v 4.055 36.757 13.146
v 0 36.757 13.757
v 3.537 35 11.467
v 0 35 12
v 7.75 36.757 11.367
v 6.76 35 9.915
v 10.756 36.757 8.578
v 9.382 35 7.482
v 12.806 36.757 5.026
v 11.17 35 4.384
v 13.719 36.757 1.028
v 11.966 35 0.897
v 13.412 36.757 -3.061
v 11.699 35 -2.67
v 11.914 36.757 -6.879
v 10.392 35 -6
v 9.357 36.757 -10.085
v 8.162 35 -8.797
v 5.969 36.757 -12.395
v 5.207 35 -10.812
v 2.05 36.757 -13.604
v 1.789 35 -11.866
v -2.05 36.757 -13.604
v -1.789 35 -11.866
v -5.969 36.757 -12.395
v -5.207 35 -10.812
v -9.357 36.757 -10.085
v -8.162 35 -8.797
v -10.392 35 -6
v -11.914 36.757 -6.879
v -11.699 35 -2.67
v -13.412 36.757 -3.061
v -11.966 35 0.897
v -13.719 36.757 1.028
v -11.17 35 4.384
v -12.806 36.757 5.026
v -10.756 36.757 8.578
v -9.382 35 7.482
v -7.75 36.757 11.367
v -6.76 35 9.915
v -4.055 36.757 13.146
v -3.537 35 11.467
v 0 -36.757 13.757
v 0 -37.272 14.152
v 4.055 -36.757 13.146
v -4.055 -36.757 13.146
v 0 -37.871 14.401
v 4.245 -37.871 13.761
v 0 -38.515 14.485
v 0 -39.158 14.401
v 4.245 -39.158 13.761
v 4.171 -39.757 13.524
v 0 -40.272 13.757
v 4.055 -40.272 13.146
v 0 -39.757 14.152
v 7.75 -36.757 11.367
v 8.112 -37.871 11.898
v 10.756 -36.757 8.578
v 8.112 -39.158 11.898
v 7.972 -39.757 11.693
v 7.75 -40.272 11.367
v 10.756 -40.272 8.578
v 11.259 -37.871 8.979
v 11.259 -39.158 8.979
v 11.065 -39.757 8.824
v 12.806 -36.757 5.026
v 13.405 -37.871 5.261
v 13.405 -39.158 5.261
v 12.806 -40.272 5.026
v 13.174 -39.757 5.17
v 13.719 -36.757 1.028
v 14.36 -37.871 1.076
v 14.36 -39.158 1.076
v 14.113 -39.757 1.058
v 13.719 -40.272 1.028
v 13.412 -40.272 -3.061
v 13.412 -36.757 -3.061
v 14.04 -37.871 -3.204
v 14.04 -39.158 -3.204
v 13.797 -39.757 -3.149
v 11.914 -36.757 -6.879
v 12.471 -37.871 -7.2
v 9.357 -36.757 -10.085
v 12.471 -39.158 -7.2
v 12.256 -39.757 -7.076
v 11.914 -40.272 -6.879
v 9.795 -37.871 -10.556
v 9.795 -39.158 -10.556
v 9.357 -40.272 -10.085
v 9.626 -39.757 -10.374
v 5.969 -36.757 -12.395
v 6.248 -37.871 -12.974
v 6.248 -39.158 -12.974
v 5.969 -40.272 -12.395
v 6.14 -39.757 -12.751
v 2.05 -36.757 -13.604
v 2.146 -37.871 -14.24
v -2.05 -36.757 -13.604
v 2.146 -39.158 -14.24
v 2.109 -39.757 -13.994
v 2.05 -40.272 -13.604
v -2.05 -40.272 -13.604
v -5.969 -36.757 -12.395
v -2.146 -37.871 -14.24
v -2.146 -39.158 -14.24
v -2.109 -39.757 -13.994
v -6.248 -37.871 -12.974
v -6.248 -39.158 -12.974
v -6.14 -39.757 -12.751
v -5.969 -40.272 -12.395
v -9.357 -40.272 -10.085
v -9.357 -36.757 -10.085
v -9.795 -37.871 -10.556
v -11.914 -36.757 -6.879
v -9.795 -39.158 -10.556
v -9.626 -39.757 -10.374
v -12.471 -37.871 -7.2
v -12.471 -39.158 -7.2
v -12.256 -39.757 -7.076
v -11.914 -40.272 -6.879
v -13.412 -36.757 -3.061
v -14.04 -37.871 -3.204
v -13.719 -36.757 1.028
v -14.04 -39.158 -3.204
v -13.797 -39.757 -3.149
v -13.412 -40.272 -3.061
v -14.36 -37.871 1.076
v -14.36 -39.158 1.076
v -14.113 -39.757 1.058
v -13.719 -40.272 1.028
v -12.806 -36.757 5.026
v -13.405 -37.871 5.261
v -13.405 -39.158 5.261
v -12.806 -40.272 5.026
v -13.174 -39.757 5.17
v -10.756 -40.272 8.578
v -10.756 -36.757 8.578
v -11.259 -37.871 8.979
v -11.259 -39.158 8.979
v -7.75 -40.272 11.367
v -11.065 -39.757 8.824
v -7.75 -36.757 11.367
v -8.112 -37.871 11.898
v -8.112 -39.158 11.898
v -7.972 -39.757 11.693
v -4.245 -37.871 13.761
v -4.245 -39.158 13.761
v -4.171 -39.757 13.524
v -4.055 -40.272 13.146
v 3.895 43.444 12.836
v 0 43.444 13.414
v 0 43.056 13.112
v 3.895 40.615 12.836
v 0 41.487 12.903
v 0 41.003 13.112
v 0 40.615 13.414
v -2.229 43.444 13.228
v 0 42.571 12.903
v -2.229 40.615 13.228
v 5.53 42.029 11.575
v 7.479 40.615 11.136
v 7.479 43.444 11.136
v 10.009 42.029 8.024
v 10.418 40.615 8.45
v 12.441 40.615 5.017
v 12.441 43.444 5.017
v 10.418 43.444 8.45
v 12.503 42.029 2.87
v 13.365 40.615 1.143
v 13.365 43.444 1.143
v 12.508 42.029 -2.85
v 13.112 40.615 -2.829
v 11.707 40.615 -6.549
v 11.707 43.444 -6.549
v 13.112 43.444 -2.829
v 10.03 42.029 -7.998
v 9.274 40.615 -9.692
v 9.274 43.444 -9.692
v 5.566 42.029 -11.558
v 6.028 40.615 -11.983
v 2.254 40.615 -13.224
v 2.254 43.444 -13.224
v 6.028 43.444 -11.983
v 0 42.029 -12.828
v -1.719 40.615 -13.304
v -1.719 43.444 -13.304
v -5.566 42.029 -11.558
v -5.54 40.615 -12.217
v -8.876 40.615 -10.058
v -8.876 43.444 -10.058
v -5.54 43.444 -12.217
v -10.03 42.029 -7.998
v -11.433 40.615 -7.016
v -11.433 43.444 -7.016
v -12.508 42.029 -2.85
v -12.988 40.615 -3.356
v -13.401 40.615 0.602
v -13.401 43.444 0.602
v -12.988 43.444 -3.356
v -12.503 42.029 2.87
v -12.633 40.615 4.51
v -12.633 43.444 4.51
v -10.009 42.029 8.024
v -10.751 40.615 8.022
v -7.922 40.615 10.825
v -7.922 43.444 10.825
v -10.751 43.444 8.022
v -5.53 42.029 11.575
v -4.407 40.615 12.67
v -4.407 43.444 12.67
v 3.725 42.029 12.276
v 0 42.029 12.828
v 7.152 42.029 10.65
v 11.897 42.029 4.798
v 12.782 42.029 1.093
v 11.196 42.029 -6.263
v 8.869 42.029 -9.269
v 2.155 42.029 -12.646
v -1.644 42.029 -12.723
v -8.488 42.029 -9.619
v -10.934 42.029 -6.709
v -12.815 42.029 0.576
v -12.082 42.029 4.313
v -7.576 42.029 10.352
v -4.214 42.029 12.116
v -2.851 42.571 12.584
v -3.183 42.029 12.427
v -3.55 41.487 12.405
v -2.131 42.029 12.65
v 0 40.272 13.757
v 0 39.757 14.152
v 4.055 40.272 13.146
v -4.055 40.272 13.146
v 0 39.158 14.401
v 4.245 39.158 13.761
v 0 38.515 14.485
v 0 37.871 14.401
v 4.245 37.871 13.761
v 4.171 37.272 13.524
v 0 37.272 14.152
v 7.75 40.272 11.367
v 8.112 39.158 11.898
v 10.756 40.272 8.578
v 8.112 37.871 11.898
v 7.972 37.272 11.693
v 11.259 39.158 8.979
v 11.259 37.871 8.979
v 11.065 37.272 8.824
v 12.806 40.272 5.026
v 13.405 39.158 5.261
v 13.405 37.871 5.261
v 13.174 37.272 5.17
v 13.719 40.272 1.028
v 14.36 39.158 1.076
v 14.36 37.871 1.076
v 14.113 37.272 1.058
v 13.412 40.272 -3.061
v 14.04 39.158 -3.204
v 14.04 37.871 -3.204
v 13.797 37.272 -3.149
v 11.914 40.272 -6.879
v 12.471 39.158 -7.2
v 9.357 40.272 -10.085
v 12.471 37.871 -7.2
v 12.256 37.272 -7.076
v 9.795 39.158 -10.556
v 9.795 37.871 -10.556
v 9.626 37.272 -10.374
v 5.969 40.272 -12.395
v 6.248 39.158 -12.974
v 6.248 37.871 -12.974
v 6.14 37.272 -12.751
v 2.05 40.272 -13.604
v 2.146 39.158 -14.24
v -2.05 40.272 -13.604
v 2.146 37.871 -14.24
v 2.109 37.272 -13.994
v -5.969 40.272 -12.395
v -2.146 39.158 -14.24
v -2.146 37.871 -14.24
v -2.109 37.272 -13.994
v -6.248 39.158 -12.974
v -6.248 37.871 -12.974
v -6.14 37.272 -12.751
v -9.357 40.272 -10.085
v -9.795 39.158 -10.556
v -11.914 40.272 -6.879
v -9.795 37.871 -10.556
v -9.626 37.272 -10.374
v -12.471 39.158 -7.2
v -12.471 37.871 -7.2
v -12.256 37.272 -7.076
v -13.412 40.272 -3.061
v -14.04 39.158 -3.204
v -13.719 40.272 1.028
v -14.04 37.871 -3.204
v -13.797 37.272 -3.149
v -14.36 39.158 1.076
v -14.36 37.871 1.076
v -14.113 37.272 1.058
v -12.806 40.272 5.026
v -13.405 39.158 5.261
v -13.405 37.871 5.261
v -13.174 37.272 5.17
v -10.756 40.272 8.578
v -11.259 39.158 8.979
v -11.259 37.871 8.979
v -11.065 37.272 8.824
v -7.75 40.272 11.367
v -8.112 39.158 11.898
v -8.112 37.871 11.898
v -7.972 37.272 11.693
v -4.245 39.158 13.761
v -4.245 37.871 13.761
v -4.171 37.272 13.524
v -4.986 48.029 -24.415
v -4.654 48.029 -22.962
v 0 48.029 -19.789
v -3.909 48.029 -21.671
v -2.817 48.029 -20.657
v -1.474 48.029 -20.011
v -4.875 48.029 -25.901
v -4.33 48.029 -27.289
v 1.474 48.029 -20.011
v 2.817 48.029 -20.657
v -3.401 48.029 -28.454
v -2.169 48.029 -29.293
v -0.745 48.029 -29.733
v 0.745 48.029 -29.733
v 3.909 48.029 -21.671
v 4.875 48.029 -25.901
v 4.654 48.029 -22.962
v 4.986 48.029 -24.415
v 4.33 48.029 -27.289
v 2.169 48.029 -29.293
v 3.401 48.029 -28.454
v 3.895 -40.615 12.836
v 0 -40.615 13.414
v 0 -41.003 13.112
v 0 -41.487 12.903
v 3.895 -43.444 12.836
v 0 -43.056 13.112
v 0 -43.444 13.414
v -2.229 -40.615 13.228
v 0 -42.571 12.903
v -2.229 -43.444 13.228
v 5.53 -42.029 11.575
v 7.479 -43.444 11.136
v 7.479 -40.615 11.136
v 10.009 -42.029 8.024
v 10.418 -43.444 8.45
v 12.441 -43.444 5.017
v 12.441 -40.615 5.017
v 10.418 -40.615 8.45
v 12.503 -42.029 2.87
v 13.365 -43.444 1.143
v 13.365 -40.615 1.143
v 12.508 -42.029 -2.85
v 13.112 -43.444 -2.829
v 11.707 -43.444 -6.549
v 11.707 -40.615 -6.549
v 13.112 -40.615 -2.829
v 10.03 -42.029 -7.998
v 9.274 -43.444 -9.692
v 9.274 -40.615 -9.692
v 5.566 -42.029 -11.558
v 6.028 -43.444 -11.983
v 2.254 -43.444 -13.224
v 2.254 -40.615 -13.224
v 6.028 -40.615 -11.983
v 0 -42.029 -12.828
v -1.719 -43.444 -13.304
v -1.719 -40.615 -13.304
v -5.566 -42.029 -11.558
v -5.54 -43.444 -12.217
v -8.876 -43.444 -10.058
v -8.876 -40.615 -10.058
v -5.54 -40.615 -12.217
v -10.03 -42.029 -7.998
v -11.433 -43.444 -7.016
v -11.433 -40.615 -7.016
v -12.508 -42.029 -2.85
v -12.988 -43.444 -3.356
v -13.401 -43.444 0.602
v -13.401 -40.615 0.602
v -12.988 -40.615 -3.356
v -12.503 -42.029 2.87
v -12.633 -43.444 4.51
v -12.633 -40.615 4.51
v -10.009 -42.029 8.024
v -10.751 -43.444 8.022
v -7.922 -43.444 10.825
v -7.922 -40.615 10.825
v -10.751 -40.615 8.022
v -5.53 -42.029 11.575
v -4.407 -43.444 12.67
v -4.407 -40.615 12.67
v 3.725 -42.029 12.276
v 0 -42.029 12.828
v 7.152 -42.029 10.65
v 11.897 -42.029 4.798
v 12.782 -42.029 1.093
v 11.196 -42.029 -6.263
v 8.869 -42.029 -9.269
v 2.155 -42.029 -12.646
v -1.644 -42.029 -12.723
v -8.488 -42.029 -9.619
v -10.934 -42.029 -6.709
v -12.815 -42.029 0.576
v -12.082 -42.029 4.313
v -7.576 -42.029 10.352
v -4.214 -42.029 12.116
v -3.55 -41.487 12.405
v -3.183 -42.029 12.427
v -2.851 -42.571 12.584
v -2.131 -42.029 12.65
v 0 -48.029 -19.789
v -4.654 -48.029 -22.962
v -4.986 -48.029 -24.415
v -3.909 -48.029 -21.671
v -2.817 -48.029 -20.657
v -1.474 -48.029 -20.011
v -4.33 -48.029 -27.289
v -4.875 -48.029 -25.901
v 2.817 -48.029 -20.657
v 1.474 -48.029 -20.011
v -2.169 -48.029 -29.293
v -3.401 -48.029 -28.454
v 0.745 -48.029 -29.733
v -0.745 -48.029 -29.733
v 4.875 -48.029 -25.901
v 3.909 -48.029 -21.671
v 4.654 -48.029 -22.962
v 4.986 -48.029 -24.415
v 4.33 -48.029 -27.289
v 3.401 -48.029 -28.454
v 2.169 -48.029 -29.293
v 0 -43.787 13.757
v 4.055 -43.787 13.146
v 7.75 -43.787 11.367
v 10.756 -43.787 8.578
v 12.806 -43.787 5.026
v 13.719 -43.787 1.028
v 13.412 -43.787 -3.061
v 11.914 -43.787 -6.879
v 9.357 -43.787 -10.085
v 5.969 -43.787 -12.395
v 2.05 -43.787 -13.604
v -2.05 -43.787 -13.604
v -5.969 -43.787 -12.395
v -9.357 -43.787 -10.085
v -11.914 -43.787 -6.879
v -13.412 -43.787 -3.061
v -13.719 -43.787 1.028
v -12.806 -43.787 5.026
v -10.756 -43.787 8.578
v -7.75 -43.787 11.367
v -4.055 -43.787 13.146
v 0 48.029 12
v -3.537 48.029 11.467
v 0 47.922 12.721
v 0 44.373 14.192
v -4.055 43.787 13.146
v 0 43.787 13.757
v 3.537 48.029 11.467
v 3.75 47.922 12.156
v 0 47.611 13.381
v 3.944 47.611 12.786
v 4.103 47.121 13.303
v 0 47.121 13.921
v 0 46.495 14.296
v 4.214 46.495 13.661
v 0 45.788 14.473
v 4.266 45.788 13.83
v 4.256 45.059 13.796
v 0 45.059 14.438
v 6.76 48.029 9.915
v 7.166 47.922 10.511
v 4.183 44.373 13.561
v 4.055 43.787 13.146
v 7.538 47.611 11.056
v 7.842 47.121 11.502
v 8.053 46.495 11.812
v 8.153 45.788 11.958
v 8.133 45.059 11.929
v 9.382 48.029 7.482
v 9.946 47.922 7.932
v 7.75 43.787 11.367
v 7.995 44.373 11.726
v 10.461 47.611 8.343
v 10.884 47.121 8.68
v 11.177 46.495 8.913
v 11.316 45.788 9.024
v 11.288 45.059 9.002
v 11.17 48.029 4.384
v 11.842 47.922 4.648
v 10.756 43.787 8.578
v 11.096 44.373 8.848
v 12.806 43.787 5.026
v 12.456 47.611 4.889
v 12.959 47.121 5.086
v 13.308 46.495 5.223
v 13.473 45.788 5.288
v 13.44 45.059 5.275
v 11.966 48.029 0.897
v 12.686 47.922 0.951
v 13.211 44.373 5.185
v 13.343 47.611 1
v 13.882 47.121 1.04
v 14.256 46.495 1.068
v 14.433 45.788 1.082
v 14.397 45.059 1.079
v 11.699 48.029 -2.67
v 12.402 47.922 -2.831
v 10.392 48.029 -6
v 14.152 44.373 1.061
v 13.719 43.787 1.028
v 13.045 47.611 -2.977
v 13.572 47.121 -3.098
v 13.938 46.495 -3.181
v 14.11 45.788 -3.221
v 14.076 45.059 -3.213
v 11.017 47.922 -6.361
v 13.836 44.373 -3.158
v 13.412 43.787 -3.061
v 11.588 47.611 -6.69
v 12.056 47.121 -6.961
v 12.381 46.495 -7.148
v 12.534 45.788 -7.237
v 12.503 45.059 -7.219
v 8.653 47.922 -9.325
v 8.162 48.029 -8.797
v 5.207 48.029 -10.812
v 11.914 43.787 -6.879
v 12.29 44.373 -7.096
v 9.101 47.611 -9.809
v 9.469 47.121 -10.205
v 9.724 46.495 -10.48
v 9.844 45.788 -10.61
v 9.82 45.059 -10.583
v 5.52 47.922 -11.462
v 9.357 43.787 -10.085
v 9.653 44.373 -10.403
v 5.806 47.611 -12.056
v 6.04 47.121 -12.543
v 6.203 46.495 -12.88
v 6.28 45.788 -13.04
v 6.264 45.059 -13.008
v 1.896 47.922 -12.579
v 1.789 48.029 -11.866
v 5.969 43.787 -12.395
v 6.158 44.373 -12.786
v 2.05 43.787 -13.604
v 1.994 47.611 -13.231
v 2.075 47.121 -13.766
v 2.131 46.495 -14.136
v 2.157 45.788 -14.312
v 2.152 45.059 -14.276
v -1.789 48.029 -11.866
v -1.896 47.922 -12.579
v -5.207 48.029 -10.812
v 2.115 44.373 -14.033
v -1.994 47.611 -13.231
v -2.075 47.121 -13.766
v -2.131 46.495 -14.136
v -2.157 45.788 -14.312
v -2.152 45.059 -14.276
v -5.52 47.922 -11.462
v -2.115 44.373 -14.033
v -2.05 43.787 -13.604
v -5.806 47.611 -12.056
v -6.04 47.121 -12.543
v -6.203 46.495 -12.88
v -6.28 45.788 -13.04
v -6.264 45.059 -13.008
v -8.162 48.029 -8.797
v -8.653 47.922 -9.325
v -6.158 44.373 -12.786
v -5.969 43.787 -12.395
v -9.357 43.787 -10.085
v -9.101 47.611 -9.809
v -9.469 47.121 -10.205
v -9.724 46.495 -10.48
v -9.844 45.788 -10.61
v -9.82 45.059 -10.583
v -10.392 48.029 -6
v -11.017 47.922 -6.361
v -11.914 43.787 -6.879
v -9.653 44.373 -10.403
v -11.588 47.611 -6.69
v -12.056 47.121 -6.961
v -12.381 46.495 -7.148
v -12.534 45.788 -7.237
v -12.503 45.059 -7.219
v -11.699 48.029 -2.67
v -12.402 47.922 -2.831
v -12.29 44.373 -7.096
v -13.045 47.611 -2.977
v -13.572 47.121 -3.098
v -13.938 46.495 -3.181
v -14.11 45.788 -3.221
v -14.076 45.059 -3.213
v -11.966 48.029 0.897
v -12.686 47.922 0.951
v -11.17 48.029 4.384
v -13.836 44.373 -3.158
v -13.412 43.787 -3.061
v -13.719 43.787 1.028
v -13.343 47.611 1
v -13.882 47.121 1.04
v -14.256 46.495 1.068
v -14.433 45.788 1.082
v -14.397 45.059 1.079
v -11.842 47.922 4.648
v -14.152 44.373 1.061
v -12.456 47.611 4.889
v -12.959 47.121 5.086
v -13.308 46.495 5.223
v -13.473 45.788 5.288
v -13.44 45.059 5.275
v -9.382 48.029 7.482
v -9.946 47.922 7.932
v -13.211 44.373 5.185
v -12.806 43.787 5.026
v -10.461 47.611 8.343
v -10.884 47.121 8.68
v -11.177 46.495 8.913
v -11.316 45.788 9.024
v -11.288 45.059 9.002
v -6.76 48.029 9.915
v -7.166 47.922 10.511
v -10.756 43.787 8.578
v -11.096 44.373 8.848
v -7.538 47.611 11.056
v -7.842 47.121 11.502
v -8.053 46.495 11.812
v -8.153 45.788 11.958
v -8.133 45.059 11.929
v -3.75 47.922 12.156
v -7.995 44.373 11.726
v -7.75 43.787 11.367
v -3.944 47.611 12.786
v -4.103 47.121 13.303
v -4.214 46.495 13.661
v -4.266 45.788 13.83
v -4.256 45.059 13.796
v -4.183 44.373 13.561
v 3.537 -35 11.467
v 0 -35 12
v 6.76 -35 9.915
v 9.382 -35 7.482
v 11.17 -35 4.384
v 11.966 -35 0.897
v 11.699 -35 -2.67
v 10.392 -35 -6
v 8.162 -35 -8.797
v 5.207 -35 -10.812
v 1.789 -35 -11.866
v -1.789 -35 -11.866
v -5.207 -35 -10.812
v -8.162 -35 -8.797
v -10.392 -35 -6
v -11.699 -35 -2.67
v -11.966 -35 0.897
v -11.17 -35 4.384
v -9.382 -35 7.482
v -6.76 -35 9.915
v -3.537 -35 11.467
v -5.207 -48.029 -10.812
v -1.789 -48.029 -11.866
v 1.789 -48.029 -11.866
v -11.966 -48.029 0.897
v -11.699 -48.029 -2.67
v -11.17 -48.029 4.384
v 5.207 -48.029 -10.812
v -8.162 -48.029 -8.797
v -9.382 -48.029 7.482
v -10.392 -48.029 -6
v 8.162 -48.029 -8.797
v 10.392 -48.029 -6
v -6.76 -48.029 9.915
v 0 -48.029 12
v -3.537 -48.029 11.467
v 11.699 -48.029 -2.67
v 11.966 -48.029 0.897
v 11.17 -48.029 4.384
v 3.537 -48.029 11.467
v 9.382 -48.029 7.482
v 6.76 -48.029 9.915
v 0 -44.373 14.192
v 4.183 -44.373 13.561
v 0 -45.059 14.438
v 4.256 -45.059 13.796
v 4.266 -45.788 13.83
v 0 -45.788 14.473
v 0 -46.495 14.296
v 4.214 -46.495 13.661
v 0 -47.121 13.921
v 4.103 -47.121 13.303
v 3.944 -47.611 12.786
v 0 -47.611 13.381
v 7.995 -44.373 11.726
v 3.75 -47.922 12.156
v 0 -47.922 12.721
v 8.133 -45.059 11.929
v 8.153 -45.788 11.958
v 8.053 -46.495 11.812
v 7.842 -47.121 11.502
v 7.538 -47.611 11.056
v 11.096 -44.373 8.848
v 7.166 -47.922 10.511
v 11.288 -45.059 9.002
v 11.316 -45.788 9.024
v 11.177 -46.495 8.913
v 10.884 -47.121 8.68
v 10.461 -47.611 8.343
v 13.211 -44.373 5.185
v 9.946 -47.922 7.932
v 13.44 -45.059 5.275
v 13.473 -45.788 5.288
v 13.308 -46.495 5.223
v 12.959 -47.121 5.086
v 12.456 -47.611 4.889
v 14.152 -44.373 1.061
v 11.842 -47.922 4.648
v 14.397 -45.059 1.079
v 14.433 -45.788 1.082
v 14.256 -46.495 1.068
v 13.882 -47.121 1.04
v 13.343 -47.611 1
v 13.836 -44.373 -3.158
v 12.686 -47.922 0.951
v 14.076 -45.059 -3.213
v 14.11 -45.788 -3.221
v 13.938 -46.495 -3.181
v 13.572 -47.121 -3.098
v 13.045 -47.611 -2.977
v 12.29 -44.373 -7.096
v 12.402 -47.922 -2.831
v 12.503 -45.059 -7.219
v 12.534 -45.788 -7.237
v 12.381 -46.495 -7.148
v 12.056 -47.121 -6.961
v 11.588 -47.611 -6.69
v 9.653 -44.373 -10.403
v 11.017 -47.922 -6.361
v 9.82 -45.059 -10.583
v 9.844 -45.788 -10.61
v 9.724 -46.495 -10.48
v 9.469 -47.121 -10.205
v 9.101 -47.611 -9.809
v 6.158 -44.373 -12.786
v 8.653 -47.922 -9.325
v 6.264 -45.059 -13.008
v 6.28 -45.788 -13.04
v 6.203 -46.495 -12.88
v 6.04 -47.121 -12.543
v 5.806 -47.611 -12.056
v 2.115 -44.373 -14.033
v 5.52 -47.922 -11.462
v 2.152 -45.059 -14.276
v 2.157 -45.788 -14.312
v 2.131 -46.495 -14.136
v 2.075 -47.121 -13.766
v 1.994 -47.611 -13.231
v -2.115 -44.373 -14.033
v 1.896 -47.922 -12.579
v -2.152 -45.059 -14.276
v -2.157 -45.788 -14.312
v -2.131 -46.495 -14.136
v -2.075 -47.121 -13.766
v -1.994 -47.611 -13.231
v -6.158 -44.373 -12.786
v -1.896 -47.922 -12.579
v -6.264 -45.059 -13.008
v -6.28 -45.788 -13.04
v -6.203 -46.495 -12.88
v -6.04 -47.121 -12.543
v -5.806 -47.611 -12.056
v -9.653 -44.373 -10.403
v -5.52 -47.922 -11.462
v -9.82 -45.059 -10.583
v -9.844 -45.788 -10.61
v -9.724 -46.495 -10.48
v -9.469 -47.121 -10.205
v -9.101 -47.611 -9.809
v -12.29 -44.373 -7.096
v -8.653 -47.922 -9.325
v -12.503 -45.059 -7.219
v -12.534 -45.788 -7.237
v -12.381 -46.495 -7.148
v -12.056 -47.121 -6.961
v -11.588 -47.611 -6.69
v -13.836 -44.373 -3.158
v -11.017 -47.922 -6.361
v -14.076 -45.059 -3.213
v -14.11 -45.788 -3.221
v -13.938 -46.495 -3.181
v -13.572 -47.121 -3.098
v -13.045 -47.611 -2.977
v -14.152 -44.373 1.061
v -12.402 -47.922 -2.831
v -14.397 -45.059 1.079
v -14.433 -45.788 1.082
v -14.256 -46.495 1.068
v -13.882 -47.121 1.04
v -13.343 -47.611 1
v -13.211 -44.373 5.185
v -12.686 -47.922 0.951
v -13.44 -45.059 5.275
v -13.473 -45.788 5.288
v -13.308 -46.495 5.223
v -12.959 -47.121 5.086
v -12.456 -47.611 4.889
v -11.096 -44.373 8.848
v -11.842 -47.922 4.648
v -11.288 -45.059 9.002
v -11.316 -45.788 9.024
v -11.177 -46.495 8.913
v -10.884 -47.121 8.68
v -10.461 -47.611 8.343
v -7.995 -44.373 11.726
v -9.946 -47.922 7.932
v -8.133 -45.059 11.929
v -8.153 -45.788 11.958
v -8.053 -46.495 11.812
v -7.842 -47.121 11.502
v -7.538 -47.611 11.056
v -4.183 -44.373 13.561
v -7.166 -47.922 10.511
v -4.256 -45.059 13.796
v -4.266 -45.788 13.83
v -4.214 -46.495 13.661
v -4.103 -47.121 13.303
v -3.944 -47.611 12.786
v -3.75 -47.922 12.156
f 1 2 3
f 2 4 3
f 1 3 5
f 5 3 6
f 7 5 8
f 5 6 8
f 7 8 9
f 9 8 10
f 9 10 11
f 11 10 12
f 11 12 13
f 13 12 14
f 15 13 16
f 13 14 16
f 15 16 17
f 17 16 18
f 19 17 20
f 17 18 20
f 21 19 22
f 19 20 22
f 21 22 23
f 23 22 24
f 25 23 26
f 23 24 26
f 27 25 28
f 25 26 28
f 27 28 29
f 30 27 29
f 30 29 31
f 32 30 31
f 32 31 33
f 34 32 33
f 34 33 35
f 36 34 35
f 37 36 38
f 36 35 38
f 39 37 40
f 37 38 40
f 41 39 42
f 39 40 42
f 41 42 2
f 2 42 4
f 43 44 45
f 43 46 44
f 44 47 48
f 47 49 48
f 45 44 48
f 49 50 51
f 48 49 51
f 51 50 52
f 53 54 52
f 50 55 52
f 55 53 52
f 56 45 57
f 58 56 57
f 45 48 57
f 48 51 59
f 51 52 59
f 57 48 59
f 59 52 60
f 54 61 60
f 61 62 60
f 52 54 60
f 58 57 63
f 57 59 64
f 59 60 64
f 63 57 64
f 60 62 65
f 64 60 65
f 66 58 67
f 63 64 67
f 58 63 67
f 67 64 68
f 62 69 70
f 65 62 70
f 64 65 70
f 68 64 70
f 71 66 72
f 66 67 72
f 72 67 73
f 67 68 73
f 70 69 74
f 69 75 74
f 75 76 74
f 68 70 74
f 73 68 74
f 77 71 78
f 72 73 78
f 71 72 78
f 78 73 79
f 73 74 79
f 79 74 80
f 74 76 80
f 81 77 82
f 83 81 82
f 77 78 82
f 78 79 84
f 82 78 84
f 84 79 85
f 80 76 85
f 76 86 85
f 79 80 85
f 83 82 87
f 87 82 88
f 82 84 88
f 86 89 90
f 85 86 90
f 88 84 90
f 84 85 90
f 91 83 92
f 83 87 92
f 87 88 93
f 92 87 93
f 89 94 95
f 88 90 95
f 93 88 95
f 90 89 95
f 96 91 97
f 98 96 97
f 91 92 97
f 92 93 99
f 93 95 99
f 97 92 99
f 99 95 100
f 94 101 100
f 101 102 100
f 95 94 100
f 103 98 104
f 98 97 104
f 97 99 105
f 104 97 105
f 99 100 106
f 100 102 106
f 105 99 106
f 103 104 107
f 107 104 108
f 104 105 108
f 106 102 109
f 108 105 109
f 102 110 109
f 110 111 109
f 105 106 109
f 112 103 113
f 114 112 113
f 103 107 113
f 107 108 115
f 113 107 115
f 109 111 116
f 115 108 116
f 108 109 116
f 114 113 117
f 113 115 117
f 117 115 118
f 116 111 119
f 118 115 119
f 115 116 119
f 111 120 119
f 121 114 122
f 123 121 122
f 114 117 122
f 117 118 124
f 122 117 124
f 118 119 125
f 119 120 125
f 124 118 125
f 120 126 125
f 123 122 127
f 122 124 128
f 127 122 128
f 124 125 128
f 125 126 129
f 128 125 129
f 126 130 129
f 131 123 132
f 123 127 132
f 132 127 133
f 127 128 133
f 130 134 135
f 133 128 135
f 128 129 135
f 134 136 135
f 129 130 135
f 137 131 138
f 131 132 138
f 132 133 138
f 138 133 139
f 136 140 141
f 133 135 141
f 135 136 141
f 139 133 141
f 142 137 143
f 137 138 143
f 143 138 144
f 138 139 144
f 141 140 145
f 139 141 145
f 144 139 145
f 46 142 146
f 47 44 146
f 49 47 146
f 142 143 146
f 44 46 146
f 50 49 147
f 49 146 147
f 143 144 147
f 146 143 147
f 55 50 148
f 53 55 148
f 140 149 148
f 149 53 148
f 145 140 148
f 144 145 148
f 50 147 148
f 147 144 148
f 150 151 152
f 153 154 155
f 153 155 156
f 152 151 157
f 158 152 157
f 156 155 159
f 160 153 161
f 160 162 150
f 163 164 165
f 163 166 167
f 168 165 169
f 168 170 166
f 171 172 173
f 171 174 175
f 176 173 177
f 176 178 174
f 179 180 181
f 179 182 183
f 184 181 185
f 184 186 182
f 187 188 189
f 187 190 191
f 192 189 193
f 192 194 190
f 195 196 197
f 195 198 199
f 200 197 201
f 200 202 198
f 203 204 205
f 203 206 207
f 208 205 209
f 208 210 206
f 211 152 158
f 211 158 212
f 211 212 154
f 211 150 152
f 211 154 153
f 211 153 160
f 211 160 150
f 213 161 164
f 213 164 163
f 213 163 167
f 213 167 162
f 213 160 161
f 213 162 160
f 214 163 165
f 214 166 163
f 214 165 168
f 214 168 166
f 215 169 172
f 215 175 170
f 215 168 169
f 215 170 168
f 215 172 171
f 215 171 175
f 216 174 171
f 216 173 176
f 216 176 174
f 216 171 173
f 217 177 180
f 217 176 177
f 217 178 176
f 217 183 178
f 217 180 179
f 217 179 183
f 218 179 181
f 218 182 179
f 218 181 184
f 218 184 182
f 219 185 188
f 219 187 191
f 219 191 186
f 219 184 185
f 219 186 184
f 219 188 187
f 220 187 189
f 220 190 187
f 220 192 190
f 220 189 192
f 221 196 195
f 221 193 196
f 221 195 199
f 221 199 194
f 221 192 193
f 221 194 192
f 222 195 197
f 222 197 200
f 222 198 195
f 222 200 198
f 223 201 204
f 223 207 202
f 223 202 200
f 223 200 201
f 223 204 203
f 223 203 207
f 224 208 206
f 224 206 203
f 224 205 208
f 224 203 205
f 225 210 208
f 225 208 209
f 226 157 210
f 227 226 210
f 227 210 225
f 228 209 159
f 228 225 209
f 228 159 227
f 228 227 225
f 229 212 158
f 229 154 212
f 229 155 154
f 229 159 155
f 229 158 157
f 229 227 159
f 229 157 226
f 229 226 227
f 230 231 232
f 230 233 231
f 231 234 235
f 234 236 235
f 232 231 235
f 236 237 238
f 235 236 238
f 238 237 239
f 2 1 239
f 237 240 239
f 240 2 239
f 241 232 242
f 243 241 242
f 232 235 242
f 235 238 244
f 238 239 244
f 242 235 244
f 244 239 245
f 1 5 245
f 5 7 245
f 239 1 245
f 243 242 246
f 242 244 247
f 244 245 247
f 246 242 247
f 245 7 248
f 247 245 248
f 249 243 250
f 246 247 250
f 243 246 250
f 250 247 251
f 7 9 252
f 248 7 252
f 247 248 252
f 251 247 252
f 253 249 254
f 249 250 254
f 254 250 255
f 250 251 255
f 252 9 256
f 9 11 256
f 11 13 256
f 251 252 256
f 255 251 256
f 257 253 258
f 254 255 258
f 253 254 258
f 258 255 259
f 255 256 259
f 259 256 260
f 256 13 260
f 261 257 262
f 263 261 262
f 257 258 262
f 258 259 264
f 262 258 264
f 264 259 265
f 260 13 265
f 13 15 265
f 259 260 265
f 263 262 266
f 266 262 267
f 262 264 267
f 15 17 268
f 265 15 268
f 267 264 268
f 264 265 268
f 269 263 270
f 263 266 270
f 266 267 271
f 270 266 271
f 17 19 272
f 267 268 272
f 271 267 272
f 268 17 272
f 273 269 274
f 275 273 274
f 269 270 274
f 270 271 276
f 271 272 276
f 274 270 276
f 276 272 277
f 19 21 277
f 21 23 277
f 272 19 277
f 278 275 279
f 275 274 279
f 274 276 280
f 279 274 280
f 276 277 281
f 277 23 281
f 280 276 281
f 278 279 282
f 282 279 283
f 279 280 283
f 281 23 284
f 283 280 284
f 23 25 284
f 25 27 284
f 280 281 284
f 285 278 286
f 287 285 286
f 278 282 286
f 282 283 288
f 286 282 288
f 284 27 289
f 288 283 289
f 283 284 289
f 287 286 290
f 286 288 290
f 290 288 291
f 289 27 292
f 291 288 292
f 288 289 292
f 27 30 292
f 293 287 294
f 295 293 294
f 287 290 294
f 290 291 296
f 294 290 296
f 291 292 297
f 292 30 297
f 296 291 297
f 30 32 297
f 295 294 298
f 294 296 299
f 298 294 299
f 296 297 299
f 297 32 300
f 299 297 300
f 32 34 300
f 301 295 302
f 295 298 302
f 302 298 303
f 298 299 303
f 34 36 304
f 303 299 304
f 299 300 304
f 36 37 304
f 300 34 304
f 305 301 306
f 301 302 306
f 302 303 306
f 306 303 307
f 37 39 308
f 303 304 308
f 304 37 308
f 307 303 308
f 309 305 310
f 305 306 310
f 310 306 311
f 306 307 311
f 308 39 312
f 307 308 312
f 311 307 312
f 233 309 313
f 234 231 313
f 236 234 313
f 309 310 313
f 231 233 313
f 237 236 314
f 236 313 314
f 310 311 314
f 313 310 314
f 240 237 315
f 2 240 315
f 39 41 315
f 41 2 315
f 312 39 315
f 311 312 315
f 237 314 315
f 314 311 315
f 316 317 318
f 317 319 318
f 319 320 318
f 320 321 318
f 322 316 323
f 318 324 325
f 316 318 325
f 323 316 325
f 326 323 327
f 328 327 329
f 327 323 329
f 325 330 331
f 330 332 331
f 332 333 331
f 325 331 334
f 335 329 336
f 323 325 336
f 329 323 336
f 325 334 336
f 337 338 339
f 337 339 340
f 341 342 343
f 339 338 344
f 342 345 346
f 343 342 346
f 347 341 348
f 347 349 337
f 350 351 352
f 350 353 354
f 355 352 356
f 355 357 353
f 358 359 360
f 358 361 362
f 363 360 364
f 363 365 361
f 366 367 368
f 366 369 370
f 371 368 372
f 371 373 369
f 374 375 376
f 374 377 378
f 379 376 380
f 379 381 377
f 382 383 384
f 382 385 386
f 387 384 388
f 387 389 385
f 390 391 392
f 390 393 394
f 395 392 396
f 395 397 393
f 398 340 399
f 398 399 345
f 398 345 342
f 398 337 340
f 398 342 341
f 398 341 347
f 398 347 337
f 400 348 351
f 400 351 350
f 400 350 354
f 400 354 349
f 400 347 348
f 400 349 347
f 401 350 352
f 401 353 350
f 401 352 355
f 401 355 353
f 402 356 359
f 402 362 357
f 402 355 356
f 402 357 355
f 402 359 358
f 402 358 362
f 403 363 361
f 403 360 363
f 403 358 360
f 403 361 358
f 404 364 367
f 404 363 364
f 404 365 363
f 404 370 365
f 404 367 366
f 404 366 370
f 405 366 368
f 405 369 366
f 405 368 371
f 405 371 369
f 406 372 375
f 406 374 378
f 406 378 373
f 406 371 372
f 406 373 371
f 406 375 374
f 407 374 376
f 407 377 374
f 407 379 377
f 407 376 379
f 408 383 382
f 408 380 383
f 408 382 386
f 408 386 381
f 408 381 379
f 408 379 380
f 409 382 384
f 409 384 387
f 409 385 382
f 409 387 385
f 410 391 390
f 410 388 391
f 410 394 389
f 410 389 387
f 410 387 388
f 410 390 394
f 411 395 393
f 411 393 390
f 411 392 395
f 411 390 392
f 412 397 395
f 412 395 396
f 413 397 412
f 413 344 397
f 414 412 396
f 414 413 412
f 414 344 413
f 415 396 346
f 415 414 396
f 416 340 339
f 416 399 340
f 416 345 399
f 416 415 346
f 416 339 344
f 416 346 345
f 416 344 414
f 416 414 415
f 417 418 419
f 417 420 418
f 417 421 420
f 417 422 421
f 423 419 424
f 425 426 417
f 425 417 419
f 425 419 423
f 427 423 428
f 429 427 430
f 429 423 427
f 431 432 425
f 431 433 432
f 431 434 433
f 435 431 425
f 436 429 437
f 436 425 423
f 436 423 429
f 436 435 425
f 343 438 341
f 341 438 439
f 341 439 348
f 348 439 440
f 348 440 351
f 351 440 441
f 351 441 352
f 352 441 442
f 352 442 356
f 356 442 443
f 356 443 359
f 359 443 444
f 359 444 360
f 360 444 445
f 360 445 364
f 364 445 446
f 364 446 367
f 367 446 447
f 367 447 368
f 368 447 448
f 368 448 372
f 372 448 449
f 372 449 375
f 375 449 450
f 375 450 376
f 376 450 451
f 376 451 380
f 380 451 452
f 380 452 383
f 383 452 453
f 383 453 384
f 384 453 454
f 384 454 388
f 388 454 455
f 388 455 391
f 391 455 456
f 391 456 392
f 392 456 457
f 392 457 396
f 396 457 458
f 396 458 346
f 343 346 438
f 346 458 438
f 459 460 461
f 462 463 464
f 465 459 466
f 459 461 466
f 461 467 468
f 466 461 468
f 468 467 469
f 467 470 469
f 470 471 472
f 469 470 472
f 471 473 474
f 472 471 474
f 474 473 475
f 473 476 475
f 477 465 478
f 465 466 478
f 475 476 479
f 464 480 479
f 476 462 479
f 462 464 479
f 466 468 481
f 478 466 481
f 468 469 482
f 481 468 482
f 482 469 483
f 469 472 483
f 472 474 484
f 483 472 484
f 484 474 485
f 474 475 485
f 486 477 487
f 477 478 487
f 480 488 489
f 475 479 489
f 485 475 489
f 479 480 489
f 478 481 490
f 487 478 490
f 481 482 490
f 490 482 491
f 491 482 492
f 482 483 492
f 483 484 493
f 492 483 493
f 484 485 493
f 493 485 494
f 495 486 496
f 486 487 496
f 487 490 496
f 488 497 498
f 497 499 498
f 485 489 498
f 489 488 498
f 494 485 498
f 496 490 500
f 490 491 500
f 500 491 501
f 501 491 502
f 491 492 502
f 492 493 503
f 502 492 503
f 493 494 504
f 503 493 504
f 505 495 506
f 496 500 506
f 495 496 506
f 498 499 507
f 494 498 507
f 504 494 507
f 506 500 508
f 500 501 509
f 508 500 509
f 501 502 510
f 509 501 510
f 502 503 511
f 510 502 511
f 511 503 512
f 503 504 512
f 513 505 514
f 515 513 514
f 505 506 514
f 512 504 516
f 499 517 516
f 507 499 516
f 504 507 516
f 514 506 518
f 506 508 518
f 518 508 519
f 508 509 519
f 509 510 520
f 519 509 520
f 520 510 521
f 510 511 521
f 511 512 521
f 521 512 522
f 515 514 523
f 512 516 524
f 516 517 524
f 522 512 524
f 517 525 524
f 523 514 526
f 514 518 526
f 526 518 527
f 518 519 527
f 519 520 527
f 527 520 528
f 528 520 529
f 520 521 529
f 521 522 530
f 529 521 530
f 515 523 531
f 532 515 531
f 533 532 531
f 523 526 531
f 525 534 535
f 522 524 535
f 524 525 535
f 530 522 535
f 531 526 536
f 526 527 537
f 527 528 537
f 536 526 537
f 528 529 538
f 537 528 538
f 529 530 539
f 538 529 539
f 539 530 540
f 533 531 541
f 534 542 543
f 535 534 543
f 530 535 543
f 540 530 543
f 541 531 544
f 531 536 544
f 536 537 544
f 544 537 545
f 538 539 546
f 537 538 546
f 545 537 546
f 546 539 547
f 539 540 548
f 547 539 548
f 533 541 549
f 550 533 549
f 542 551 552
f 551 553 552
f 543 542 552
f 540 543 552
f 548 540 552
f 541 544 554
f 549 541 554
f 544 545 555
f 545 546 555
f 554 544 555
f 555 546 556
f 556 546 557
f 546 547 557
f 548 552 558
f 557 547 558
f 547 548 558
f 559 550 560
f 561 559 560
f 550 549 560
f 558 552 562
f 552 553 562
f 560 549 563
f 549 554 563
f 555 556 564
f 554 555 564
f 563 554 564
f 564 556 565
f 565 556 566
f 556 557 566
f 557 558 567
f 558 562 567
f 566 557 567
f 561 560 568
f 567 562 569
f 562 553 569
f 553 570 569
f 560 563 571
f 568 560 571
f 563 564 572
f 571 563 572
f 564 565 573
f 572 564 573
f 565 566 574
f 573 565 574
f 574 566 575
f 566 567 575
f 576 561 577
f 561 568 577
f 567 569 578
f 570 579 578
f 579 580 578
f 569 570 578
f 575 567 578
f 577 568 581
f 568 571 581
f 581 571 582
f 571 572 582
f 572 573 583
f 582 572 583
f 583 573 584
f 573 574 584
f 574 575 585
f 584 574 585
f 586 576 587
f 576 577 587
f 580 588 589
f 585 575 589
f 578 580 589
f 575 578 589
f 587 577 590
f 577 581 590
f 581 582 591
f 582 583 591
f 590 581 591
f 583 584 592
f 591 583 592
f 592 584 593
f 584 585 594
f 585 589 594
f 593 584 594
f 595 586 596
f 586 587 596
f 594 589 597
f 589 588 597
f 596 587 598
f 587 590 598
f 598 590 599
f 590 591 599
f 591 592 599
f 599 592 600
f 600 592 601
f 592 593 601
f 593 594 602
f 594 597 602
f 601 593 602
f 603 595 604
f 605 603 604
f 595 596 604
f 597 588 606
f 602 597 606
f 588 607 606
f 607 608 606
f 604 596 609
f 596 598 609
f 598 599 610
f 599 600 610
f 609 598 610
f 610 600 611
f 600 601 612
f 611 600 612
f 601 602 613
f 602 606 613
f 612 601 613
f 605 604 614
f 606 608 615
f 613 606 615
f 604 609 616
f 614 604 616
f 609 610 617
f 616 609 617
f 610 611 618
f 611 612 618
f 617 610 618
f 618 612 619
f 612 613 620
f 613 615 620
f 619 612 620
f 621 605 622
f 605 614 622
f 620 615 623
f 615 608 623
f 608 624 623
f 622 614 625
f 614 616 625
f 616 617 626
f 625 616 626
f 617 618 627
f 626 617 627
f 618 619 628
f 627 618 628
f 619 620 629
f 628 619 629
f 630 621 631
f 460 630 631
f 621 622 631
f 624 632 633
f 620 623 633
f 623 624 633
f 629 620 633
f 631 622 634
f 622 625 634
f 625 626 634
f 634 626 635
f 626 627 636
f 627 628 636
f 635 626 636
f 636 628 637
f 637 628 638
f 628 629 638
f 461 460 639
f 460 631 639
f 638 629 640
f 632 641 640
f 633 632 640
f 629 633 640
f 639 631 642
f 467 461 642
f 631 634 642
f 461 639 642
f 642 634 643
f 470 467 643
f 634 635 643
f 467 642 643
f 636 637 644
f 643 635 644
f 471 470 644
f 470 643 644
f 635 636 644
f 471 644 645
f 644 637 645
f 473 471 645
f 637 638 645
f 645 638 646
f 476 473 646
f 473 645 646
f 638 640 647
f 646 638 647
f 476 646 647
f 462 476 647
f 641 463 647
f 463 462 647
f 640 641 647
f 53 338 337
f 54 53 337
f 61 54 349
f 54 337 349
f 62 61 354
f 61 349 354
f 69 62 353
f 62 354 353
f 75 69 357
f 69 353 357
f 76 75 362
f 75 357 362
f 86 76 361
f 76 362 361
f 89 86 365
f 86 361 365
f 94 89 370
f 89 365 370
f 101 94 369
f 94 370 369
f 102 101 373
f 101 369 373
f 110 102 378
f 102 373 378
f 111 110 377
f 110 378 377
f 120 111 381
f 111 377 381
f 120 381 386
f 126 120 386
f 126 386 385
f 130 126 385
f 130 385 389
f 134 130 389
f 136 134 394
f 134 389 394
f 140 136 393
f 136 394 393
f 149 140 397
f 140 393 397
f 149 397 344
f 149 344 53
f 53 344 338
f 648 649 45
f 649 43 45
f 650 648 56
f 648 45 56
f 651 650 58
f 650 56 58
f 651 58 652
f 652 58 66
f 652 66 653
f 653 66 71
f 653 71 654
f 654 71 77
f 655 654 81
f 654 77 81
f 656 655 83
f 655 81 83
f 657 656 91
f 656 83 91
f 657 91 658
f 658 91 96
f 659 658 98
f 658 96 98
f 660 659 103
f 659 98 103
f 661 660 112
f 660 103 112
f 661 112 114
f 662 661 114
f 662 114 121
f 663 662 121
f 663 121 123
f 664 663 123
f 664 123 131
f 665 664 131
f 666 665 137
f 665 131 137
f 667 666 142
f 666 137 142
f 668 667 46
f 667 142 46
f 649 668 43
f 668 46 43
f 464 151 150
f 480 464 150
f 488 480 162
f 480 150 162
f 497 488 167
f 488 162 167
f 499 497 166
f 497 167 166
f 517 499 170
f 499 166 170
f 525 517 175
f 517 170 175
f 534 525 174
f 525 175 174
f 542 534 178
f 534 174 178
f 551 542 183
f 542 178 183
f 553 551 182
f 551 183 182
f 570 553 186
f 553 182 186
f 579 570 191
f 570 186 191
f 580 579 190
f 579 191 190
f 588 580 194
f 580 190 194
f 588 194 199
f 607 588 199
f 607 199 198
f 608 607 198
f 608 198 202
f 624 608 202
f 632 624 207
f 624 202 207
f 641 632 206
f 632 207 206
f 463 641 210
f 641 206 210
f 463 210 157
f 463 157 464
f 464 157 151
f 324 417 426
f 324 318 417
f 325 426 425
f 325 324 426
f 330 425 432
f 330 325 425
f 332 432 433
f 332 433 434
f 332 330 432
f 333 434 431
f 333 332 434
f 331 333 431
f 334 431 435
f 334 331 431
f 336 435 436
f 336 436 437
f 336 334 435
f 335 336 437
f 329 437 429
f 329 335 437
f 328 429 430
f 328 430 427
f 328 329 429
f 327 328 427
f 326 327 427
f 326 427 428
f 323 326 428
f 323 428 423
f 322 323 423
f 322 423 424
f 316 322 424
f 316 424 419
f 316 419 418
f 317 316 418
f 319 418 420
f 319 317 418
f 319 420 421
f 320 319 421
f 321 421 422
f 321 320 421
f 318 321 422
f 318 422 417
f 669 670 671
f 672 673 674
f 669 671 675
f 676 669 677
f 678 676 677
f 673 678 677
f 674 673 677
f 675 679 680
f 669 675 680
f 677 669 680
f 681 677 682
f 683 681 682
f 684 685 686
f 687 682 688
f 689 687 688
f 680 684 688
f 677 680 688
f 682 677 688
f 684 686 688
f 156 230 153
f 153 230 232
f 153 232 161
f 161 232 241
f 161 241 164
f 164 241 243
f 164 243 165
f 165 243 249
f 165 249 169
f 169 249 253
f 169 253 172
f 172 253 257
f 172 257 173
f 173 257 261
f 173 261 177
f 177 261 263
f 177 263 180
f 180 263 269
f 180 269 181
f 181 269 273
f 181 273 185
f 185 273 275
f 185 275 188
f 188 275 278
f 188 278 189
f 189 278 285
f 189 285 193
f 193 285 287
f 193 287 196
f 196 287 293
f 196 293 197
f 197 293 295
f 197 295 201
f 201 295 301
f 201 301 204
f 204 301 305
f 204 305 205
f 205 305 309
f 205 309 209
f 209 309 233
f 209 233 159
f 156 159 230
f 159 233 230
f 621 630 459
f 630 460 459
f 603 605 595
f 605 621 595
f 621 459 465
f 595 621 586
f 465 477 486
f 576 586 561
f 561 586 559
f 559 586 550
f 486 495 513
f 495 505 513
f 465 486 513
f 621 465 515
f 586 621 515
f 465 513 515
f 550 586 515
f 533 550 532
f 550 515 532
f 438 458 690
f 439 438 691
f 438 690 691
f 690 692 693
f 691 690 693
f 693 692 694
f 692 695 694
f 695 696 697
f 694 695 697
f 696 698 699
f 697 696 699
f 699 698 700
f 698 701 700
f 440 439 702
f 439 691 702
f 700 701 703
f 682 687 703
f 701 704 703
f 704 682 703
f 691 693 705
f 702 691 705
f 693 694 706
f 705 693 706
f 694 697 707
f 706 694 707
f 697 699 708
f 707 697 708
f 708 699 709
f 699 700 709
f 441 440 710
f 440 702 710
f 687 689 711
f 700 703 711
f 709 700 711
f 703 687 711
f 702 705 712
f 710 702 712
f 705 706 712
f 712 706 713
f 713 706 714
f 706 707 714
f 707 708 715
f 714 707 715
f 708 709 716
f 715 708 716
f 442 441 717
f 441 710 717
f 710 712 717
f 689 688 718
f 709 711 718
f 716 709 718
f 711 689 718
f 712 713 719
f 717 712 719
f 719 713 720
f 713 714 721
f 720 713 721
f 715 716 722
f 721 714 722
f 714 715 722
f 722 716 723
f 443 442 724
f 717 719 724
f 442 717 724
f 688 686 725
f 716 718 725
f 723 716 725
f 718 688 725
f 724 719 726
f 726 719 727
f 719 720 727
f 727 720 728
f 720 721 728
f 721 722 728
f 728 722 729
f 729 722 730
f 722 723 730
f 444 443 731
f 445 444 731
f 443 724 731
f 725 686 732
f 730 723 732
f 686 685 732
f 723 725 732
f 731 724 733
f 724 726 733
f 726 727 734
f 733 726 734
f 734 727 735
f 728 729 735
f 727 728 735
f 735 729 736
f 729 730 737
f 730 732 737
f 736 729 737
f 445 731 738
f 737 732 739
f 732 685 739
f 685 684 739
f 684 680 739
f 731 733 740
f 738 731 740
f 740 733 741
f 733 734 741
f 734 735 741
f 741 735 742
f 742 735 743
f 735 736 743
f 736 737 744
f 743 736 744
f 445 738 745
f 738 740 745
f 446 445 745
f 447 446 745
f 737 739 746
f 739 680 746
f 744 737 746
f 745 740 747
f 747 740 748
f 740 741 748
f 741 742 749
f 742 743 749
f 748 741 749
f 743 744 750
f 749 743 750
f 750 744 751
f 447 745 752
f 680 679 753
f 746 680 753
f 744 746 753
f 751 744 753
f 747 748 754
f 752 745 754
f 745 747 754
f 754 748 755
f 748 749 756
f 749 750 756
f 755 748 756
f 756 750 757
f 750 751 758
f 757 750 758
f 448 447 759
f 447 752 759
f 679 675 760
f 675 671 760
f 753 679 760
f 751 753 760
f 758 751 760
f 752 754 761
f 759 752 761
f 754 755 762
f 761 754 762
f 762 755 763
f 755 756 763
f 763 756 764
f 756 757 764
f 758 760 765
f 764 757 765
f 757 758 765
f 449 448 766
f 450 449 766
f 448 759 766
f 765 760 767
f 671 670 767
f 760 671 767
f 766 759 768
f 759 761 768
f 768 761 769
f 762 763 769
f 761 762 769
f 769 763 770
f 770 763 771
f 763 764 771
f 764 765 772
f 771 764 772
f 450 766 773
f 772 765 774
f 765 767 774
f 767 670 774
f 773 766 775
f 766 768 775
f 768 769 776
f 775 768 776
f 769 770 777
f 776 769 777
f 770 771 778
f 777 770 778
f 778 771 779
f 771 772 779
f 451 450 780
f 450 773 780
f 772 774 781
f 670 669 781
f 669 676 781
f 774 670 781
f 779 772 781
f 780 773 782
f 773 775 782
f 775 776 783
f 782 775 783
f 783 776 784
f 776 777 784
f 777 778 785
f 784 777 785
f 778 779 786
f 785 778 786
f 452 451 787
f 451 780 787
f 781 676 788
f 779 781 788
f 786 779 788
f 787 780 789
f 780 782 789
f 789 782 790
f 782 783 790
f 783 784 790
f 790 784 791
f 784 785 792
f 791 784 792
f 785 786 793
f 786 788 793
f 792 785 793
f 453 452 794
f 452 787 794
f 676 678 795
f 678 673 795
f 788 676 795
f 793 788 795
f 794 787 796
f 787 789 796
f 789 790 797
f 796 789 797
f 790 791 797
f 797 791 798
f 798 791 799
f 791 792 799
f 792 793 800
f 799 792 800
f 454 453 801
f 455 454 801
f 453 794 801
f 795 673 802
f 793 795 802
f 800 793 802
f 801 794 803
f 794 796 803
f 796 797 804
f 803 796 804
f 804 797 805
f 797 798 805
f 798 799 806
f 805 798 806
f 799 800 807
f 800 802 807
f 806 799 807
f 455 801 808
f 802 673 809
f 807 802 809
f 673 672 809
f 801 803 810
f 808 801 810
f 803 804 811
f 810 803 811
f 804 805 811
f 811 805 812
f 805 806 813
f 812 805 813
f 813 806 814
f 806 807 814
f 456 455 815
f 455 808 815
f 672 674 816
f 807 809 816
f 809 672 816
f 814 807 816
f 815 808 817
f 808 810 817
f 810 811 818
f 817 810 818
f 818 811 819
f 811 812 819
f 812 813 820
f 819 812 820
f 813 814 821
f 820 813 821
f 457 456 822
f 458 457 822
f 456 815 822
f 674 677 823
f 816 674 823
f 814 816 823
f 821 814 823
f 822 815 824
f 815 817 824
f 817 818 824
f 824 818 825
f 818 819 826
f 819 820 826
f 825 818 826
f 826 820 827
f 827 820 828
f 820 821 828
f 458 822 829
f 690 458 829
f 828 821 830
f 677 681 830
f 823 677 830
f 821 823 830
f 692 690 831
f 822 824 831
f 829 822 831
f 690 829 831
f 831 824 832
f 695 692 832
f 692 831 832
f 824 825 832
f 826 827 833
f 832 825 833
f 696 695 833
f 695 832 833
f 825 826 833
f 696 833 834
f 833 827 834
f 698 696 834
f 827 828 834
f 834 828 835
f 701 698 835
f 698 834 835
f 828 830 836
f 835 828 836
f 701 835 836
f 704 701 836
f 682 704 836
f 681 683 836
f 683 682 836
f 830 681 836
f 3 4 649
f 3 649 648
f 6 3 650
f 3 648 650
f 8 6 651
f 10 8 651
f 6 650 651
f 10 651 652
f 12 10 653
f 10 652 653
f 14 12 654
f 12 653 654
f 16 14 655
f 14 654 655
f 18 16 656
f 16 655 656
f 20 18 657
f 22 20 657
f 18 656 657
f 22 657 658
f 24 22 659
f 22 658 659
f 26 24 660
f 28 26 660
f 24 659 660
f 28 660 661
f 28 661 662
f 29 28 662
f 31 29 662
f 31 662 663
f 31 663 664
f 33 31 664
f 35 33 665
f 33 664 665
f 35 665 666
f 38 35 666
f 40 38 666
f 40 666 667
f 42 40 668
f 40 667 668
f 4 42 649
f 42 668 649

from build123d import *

# Parameters (mm, degrees)
F2_R = 2
F0_W = 96.058874
F0_H = 5


with BuildPart() as f1:
    # F0 (on Right) → F1 (revolve)
    with BuildSketch(Plane.YZ):
        with BuildLine():
            Line((-48.029437, 12), (-48.029437, 0))
            Line((-48.029437, 0), (48.029437, 0))
            Line((48.029437, 0), (48.029437, 12))
            ThreePointArc((48.029437, 12), (46.495232, 14.296101), (43.786797, 13.75736))
            Line((43.786797, 13.75736), (42.029437, 12))
            Line((42.029437, 12), (40.272078, 13.75736))
            ThreePointArc((40.272078, 13.75736), (38.514718, 14.485282), (36.757359, 13.75736))
            Line((36.757359, 13.75736), (35, 12))
            Line((35, 12), (-35, 12))
            Line((-35, 12), (-36.757359, 13.75736))
            ThreePointArc((-36.757359, 13.75736), (-38.514718, 14.485282), (-40.272078, 13.75736))
            Line((-40.272078, 13.75736), (-42.029437, 12))
            Line((-42.029437, 12), (-43.786797, 13.75736))
            ThreePointArc((-43.786797, 13.75736), (-46.495232, 14.296101), (-48.029437, 12))
        make_face()
    revolve(axis=Axis((0, 0, 0), (0, 1, 0)))

    # F2
    f2_edges = [f1.edges().sort_by_distance(p)[0] for p in [
        (0, -42.029437, -12),
        (0, 42.029437, -12),
    ]]
    fillet(f2_edges, radius=F2_R)


with BuildPart() as f3:
    # F0 (on Right) → F3 (revolve)
    with BuildSketch(Plane.YZ):
        with Locations((0, -22.288572)):
            Rectangle(F0_W, F0_H)
    revolve(axis=Axis((0, 0, -24.788572), (0, 1, 0)))


solid = Compound([f1.part, f3.part])
